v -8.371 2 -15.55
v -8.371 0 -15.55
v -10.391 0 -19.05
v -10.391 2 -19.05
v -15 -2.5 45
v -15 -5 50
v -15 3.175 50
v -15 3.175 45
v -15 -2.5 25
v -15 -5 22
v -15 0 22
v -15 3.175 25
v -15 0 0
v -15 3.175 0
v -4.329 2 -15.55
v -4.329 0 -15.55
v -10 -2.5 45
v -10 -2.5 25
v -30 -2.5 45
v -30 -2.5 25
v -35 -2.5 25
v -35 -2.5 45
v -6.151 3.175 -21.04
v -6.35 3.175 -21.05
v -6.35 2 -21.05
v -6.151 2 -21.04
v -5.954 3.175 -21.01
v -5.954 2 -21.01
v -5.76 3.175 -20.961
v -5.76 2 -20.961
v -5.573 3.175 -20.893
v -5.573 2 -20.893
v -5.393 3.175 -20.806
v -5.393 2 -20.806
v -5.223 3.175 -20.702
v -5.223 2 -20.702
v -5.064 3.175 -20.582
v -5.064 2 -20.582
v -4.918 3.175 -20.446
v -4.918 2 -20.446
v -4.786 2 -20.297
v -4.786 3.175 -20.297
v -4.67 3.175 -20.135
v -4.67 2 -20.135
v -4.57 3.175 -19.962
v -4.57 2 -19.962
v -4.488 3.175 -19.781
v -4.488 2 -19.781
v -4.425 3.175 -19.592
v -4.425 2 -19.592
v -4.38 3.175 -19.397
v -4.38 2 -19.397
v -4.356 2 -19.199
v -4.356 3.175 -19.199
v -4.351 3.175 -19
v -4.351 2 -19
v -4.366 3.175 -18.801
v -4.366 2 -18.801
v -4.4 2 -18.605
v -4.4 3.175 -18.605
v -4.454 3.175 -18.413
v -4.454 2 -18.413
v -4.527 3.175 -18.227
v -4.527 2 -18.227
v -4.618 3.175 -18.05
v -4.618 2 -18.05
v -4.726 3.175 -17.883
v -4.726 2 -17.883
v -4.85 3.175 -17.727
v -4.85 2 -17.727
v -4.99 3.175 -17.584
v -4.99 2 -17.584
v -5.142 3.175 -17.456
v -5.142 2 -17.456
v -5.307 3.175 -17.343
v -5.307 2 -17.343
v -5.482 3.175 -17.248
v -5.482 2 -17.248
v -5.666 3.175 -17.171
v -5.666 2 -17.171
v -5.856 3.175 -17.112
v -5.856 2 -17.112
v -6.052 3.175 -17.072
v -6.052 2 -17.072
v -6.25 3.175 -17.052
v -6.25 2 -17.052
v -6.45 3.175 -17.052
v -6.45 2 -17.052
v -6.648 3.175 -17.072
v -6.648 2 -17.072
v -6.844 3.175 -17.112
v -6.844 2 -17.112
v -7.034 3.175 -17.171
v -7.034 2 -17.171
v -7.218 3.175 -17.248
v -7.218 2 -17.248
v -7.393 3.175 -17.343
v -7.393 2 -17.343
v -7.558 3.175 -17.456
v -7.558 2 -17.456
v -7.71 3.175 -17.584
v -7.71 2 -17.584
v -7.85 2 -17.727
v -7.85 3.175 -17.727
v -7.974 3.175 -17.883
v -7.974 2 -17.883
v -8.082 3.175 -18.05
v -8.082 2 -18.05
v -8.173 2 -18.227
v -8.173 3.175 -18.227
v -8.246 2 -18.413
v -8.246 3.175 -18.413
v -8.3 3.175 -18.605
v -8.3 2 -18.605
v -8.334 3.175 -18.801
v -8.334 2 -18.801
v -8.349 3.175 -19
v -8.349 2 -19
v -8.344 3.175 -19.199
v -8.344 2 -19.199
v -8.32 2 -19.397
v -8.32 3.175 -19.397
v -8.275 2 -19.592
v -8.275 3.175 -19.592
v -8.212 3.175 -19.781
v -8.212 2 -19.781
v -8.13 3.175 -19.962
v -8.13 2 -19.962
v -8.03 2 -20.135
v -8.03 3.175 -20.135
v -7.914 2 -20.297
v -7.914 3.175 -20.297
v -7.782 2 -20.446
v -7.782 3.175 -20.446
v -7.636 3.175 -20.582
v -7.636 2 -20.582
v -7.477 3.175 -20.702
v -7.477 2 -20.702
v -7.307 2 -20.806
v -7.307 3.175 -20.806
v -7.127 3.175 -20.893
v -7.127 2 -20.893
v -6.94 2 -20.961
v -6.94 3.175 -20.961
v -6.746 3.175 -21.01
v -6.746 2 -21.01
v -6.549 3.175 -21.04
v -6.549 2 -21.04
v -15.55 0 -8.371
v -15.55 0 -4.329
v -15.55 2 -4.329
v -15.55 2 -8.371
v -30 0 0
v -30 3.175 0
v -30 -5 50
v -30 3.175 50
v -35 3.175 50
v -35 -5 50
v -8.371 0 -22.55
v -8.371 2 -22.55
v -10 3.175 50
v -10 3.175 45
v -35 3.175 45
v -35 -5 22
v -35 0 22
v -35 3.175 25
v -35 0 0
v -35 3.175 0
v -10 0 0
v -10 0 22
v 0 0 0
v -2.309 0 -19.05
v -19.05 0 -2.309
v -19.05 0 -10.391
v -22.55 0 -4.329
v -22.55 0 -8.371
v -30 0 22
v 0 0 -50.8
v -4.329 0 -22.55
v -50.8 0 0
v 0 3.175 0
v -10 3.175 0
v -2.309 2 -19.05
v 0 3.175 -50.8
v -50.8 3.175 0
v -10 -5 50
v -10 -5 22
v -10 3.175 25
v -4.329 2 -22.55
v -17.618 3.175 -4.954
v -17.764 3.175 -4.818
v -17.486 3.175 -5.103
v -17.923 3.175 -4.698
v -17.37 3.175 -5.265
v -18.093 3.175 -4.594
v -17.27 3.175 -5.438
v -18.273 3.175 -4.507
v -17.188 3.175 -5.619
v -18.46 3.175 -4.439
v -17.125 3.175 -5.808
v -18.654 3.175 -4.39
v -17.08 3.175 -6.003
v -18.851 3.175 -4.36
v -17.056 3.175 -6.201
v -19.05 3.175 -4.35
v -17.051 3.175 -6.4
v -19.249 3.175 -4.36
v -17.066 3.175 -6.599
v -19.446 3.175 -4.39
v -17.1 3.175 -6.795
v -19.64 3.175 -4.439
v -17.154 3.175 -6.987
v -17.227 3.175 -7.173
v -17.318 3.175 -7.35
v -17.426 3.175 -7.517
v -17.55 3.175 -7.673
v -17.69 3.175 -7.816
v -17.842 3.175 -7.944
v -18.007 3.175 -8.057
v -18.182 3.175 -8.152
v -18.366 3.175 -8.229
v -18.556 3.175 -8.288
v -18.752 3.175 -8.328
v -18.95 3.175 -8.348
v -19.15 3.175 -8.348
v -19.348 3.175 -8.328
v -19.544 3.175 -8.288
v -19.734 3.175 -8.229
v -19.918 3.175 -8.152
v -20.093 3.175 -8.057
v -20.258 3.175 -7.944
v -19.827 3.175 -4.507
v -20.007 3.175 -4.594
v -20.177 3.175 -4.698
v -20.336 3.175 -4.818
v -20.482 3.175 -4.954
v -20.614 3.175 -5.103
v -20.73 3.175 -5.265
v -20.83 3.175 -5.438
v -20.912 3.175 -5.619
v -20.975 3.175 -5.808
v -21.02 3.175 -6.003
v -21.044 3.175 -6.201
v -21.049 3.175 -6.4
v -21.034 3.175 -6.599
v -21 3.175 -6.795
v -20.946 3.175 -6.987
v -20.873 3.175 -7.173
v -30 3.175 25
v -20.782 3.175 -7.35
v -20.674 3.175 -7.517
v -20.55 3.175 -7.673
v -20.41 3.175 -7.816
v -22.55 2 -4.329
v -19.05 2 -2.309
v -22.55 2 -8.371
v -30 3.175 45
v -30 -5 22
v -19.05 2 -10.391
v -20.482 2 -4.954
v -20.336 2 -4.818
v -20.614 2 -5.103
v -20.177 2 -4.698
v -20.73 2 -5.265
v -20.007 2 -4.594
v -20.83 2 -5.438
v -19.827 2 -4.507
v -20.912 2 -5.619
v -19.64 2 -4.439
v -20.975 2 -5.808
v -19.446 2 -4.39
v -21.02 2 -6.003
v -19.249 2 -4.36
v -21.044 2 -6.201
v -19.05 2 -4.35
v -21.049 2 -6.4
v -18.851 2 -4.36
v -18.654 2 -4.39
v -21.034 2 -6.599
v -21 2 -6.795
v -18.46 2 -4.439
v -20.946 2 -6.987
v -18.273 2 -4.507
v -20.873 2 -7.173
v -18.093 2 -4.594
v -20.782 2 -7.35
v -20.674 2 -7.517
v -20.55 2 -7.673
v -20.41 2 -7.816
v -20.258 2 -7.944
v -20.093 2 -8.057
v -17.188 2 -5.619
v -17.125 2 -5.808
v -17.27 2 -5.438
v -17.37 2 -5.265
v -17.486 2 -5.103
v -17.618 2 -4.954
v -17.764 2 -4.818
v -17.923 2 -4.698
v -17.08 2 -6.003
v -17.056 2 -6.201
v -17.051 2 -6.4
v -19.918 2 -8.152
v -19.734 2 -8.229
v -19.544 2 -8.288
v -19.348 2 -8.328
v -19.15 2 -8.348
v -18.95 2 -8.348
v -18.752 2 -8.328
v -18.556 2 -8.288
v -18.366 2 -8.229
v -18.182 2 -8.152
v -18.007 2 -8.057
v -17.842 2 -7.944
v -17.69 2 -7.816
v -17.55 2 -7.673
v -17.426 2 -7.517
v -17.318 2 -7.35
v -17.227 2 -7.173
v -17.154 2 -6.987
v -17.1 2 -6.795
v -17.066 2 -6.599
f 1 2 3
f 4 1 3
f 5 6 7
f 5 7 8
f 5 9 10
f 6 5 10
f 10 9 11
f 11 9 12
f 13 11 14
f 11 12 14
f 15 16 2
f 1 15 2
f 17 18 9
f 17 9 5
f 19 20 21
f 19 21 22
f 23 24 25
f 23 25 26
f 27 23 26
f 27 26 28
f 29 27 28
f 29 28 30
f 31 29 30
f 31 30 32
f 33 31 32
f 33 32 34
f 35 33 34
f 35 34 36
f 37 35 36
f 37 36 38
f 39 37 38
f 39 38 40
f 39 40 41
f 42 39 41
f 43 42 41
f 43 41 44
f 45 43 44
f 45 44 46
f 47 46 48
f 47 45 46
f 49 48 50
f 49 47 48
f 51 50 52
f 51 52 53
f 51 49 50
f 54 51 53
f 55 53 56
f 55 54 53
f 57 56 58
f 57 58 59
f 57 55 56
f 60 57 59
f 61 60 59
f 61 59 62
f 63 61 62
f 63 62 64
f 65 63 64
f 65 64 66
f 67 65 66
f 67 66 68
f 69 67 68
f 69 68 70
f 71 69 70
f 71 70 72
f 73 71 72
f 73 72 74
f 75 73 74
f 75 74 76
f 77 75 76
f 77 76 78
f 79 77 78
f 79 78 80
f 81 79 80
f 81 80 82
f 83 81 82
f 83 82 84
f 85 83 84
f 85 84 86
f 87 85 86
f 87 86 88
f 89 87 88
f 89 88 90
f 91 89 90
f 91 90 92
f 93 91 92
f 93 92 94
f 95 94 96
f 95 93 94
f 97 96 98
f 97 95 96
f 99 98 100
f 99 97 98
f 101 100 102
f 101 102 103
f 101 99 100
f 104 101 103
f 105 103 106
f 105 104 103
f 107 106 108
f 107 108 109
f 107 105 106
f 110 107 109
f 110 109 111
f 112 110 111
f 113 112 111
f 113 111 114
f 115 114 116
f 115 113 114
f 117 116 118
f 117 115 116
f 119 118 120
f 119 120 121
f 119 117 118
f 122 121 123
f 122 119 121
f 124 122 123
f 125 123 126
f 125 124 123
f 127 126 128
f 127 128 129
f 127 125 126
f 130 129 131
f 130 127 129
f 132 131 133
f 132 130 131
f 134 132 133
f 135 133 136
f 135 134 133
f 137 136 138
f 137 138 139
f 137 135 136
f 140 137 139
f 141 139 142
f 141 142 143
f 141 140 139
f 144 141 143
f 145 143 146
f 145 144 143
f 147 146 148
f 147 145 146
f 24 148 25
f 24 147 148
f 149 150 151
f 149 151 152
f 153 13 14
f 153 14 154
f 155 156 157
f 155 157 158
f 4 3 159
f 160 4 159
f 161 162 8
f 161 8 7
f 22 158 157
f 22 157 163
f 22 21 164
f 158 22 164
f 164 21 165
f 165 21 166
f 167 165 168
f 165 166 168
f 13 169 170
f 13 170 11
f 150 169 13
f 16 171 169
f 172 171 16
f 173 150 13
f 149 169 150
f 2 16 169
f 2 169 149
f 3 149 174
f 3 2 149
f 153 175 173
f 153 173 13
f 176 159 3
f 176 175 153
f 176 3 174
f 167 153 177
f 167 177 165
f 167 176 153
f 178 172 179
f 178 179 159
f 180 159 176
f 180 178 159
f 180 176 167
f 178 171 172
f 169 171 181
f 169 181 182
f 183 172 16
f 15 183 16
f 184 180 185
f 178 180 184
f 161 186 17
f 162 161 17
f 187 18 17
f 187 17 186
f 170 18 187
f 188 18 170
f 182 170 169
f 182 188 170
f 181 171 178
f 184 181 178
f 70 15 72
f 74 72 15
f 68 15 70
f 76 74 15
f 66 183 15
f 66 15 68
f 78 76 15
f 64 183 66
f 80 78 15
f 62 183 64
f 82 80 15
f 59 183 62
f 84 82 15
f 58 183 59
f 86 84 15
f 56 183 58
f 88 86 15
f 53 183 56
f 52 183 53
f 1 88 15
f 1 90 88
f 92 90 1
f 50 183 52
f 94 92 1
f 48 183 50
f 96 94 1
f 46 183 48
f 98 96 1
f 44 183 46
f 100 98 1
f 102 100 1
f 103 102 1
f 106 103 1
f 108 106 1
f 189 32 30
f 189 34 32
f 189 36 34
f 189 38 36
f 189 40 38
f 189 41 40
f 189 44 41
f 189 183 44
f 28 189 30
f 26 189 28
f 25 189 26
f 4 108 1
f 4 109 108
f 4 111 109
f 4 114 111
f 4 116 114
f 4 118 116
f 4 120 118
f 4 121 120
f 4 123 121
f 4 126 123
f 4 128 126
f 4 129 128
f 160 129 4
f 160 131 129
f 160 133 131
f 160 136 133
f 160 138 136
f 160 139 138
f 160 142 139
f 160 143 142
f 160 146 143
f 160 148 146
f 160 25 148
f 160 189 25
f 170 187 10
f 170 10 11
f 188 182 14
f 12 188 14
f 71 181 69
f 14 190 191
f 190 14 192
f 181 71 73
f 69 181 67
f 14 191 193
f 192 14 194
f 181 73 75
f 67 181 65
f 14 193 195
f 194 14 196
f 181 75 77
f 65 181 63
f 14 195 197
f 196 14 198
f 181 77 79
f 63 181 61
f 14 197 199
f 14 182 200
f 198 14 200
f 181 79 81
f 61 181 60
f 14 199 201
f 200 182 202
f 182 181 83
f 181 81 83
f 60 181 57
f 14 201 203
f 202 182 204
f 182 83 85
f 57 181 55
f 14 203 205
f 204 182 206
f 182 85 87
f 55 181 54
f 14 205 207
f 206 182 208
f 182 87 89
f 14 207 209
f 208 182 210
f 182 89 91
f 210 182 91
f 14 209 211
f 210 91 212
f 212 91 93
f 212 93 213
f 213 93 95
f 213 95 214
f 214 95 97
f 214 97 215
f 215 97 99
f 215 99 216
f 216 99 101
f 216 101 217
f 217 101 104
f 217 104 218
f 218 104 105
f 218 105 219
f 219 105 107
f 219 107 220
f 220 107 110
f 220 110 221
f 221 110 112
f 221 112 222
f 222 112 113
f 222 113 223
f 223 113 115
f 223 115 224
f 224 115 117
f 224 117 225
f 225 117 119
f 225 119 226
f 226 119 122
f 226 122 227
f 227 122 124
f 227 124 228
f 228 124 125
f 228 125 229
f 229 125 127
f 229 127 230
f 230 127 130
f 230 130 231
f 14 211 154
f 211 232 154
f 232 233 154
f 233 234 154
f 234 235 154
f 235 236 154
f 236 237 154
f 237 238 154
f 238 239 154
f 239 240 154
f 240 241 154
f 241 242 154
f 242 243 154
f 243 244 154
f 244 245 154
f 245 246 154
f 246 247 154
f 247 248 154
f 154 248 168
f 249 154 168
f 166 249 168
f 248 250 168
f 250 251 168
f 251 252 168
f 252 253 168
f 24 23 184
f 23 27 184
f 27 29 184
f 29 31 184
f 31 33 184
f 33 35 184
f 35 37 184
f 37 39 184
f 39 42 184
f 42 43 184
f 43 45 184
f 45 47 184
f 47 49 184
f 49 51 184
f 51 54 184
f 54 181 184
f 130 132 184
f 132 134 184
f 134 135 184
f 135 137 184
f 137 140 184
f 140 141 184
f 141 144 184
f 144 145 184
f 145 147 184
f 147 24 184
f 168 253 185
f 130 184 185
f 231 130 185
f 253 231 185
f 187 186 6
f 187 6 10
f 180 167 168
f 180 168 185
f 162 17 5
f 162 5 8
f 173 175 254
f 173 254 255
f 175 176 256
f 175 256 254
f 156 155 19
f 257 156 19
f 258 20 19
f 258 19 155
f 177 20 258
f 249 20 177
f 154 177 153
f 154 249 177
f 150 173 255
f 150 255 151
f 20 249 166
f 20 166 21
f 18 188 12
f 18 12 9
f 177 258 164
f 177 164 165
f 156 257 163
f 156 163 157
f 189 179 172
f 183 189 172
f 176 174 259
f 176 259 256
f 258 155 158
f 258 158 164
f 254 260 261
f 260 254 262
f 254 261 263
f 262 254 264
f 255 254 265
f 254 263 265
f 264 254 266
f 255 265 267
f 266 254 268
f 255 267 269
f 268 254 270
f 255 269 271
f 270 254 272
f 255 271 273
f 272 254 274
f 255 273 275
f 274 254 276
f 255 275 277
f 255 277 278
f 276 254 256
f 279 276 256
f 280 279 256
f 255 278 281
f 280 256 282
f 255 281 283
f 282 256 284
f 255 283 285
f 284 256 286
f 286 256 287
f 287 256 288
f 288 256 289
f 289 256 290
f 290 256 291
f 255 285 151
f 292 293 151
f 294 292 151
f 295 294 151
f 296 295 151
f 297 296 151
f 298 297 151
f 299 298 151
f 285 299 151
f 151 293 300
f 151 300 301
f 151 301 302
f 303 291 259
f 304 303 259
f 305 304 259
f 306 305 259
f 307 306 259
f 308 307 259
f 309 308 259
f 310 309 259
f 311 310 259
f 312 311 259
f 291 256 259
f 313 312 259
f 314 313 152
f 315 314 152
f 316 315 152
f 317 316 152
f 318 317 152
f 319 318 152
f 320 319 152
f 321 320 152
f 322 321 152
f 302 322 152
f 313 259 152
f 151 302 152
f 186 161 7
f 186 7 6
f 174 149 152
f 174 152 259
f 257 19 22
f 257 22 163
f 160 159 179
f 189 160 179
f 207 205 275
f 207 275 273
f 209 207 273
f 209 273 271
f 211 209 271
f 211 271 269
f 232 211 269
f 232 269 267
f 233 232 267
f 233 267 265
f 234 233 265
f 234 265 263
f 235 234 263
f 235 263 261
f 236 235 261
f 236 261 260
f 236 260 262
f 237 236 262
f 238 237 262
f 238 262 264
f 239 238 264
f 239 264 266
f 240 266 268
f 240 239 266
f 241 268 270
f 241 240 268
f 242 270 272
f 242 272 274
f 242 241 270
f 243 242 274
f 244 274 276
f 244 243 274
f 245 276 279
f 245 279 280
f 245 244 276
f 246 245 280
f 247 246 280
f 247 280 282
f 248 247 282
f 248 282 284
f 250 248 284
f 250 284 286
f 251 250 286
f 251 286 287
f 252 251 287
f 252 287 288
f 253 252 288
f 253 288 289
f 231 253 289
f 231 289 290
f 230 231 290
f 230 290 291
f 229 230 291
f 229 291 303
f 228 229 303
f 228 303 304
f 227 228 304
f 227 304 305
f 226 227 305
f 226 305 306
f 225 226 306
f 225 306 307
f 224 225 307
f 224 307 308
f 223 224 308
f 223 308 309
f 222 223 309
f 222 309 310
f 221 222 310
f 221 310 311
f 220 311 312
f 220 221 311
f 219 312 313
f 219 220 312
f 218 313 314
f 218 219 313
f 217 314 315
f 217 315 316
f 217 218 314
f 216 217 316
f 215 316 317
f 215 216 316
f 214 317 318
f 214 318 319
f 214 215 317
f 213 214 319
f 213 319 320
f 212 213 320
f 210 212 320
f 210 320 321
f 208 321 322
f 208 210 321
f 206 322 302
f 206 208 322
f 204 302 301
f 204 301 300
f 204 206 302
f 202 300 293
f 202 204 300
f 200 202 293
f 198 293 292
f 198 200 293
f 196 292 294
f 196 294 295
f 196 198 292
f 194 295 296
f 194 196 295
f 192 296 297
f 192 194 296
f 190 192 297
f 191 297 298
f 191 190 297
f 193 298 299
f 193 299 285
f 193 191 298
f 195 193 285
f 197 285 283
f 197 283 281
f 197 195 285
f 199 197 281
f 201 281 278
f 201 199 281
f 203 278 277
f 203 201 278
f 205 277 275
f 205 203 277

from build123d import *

# Parameters (mm, degrees)
BOSS_EXTRUDE1_DEPTH     = 3.175
SKETCH2_R               = 2
CUT_EXTRUDE1_DEPTH      = 72.912172996
CUT_EXTRUDE2_START      = -3.175
CUT_EXTRUDE2_DEPTH      = 2
BOSS_EXTRUDE2_START     = 10
BOSS_EXTRUDE2_DEPTH     = 5
BOSS_EXTRUDE3_START     = 30
BOSS_EXTRUDE3_DEPTH     = 5
CUT_EXTRUDE3_DEPTH      = 73.015831593
CUT_EXTRUDE3_DEPTH_BACK = 73.015831593
SKETCH6_W               = 50.943951029
SKETCH6_H               = 108.352089197


with BuildPart() as part:
    # Sketch1 → Boss-Extrude1 (new body)
    with BuildSketch(Plane(origin=(0, 0, 0), x_dir=(1, 0, 0), z_dir=(0, 1, 0))):
        Polygon((0, 0), (50.8, 0), (0, 50.8), align=None)
    extrude(amount=BOSS_EXTRUDE1_DEPTH)

    # Sketch2 → Cut-Extrude1 (cut, through all)
    with BuildSketch(Plane(origin=(0, 3.175, 0), x_dir=(1, 0, 0), z_dir=(0, 1, 0))):
        with Locations(Location((19.05, 6.35, 0), (0, 0, 270))):
            Circle(SKETCH2_R)
        with Locations(Location((6.35, 19.05, 0), (0, 0, 90))):
            Circle(SKETCH2_R)
    extrude(amount=-CUT_EXTRUDE1_DEPTH, mode=Mode.SUBTRACT)

    # Sketch3 → Cut-Extrude2 (cut)
    with BuildSketch(Plane(origin=(0, 3.175, 0), x_dir=(1, 0, 0), z_dir=(0, 1, 0)).offset(CUT_EXTRUDE2_START)):
        Polygon((8.370723055, 15.550005), (10.391446111, 19.05), (8.370723055, 22.549995), (4.329276945, 22.549995), (2.308553889, 19.05), (4.329276945, 15.550005), align=None)
        Polygon((22.549995, 4.329276945), (19.05, 2.308553889), (15.550005, 4.329276945), (15.550005, 8.370723055), (19.05, 10.391446111), (22.549995, 8.370723055), align=None)
    extrude(amount=CUT_EXTRUDE2_DEPTH, mode=Mode.SUBTRACT)

    # Sketch5 → Boss-Extrude2 (add)
    with BuildSketch(Plane(origin=(0, 0, 0), x_dir=(0, 0, -1), z_dir=(1, 0, 0)).offset(BOSS_EXTRUDE2_START)):
        Polygon((0, 0), (0, 3.175), (-25, 3.175), (-25, -2.5), (-45, -2.5), (-45, 3.175), (-50, 3.175), (-50, -5), (-22, -5), (-22, 0), align=None)
    extrude(amount=BOSS_EXTRUDE2_DEPTH)

    # Sketch5<3> → Boss-Extrude3 (add)
    with BuildSketch(Plane(origin=(0, 0, 0), x_dir=(0, 0, -1), z_dir=(1, 0, 0)).offset(BOSS_EXTRUDE3_START)):
        Polygon((0, 0), (0, 3.175), (-25, 3.175), (-25, -2.5), (-45, -2.5), (-45, 3.175), (-50, 3.175), (-50, -5), (-22, -5), (-22, 0), align=None)
    extrude(amount=BOSS_EXTRUDE3_DEPTH)

    # Mirror1: part across plane


with BuildPart() as part_1:
    add(part.part)
    add(part.part.mirror(Plane(origin=(0, 0, 0), x_dir=(0, 0, 1), z_dir=(1, 0, 0))))

    # Sketch6 → Cut-Extrude3 (cut, two sides: drawn at the far end of the back side and taken through both)
    with BuildSketch(Plane(origin=(0, 0, 0), x_dir=(1, 0, 0), z_dir=(0, 1, 0)).offset(-CUT_EXTRUDE3_DEPTH_BACK)):
        with Locations((25.471975515, -0.138682261)):
            Rectangle(SKETCH6_W, SKETCH6_H)
    extrude(amount=CUT_EXTRUDE3_DEPTH + CUT_EXTRUDE3_DEPTH_BACK, mode=Mode.SUBTRACT)


solid = part_1.part
